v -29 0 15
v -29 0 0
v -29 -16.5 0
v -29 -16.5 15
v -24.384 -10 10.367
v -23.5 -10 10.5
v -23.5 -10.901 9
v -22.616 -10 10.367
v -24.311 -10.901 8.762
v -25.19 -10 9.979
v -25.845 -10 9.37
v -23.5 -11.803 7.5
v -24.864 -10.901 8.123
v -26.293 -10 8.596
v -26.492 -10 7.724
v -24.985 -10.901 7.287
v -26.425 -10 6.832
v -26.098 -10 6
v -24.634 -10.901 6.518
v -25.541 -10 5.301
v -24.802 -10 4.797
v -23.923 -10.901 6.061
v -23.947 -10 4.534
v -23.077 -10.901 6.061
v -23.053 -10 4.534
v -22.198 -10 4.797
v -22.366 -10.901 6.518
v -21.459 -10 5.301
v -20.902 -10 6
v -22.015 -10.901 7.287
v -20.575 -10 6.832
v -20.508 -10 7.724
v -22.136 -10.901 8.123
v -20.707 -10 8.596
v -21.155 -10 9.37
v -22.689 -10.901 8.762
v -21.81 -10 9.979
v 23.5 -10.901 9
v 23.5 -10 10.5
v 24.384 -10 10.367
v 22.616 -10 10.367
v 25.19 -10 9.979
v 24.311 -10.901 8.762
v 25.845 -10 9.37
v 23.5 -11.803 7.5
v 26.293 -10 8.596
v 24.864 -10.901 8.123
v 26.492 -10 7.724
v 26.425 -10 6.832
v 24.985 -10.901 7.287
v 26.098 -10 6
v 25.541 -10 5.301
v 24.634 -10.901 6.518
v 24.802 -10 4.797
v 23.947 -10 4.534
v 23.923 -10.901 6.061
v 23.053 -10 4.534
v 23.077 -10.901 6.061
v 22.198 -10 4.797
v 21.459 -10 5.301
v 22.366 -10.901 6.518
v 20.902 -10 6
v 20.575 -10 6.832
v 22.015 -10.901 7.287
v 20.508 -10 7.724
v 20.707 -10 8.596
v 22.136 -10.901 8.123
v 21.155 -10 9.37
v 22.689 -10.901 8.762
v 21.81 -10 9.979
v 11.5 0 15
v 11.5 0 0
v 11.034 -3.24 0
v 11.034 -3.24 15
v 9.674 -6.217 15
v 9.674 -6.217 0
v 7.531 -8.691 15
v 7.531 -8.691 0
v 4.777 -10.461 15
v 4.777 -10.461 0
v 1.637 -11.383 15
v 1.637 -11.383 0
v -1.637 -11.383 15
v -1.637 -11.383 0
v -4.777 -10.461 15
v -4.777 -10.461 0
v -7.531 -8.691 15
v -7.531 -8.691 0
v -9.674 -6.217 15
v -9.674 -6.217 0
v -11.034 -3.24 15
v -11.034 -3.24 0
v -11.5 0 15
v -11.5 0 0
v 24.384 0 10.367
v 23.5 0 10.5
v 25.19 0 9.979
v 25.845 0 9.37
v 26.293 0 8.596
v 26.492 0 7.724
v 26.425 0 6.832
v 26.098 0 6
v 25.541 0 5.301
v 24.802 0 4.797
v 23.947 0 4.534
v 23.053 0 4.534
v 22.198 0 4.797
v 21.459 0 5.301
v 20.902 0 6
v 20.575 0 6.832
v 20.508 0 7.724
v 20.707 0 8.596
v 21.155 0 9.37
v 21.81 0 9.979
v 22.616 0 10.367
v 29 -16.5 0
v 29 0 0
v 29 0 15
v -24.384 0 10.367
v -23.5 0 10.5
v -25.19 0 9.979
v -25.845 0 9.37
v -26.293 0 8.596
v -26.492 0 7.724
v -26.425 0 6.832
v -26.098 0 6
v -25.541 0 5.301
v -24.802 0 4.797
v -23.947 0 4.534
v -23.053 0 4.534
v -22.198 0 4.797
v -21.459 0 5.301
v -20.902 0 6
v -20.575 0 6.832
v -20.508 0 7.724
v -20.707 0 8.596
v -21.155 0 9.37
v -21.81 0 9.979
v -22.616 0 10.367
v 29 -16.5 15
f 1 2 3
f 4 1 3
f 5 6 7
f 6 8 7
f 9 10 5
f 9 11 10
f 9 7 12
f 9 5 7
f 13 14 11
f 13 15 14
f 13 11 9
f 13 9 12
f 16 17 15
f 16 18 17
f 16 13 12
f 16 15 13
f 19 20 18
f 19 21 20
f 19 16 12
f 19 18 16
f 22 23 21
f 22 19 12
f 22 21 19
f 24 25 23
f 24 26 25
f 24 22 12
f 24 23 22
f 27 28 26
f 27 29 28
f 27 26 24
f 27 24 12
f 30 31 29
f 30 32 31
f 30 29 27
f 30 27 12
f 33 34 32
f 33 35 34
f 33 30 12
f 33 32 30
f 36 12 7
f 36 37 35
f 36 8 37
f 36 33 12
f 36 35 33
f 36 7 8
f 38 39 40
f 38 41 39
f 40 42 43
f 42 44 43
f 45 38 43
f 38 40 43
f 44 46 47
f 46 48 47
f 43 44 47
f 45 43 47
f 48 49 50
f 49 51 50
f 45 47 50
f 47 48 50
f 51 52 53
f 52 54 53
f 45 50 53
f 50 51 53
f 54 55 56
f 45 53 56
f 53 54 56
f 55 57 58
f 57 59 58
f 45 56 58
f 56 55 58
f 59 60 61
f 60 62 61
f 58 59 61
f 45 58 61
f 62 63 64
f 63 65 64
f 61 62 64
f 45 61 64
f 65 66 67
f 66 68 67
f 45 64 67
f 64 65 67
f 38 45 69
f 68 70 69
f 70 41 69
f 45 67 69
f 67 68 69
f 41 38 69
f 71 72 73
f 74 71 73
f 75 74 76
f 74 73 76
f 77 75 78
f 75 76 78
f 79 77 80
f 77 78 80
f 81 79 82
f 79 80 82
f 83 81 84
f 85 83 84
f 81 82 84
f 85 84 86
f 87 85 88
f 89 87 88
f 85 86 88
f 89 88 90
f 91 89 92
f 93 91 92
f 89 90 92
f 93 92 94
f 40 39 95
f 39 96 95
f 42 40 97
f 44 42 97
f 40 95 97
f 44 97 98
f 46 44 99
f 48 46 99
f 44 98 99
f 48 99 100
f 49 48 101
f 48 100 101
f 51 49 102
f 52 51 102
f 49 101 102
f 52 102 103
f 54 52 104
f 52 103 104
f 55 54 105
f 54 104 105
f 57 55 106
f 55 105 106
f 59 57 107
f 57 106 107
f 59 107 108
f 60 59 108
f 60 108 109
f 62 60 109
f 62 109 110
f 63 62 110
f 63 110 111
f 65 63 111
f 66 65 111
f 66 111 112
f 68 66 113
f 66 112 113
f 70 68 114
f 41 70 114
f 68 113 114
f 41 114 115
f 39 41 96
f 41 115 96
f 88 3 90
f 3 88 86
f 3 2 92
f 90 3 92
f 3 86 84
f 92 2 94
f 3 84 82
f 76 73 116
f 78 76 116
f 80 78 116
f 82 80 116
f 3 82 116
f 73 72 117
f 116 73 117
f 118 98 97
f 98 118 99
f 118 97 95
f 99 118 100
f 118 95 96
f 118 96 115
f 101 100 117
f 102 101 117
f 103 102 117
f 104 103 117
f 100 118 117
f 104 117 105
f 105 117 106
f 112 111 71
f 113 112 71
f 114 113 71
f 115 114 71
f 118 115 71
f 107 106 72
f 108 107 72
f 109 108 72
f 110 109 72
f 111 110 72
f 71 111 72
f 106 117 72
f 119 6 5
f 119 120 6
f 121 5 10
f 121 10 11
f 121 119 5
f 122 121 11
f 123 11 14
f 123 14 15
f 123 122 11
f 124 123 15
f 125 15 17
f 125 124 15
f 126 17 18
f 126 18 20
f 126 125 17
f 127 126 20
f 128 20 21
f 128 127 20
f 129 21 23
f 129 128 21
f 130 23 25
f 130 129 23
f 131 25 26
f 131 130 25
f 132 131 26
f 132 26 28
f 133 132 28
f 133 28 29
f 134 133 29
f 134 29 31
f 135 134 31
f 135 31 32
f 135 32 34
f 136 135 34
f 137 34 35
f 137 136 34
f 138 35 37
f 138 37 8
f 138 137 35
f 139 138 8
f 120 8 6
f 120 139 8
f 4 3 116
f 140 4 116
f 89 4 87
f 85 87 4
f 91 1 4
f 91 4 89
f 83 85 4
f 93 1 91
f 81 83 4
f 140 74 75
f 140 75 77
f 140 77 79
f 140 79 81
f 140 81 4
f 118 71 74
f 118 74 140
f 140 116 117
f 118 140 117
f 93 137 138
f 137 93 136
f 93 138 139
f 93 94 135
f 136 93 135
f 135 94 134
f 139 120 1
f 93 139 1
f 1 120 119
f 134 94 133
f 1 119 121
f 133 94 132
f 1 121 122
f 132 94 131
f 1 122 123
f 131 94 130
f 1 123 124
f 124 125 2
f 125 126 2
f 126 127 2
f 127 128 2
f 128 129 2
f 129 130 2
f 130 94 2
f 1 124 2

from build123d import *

# Parameters (mm, degrees)
DODANIE_WYCI_GNI_CIE1_DEPTH = 15


with BuildPart() as part:
    # Szkic1 → Dodanie-wyciągnięcie1 (new body)
    with BuildSketch(Plane.XY):
        with BuildLine():
            Line((-11.5, 0), (-29, 0))
            Line((-29, 0), (-29, -16.5))
            Line((-29, -16.5), (29, -16.5))
            Line((29, -16.5), (29, 0))
            Line((29, 0), (11.5, 0))
            ThreePointArc((11.5, 0), (0, -11.5), (-11.5, 0))
        make_face()
    extrude(amount=DODANIE_WYCI_GNI_CIE1_DEPTH)

    # Szkic3 → Otwory ustalające Ø6.0mm1 (revolve, cut)
    with BuildSketch(Plane(origin=(-23.5, 0, 7.5), x_dir=(0, 0, 1), z_dir=(1, 0, 0))):
        Polygon((0, 0), (0, 11.802581857), (3, 10), (3, 0), align=None)
    otwory_ustalaj_ce_6_0mm1 = revolve(axis=Axis((-23.5, 6.35, 7.5), (0, -1, 0)), mode=Mode.SUBTRACT)

    # Lustro1: Otwory ustalające Ø6.0mm1 across plane
    add(otwory_ustalaj_ce_6_0mm1.mirror(Plane(origin=(0, 0, 0), x_dir=(0, 0, 1), z_dir=(1, 0, 0))), mode=Mode.SUBTRACT)


solid = part.part
